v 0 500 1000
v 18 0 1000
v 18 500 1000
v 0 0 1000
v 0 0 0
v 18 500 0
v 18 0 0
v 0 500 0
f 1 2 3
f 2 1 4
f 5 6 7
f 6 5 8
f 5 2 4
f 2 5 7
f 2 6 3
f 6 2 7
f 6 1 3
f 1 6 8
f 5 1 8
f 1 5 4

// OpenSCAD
// file: ../config/TF3D-SDC-01_dimensions.scad
// Modelo fijo TF3D-SDC-01 — unidades en mm
CABINET_W = 800;
CABINET_H = 1000;
CABINET_D = 500;
BOARD_T = 18;
INNER_W = CABINET_W - 2*BOARD_T;
INNER_H = CABINET_H - 2*BOARD_T;
BACK_W = INNER_W;
BACK_H = INNER_H;
BACK_T = BOARD_T;
SHELF_W = INNER_W;
SHELF_D = 450;
SHELF_T = BOARD_T;
TECH_H = 160;
SHELF_Z_1 = 250;
SHELF_Z_2 = 480;
SHELF_Z_3 = 710;
MELAMINE = [0.94,0.94,0.94];
ACRYLIC = [0.65,0.85,1.00,0.30];
METAL = [0.10,0.10,0.10];
// file: ../config/common.scad
include <TF3D-SDC-01_dimensions.scad>
module board(size=[100,100,18], board_color=MELAMINE){ color(board_color) cube(size); }
// main file
include <../config/common.scad>
board([BOARD_T,CABINET_D,CABINET_H]);
